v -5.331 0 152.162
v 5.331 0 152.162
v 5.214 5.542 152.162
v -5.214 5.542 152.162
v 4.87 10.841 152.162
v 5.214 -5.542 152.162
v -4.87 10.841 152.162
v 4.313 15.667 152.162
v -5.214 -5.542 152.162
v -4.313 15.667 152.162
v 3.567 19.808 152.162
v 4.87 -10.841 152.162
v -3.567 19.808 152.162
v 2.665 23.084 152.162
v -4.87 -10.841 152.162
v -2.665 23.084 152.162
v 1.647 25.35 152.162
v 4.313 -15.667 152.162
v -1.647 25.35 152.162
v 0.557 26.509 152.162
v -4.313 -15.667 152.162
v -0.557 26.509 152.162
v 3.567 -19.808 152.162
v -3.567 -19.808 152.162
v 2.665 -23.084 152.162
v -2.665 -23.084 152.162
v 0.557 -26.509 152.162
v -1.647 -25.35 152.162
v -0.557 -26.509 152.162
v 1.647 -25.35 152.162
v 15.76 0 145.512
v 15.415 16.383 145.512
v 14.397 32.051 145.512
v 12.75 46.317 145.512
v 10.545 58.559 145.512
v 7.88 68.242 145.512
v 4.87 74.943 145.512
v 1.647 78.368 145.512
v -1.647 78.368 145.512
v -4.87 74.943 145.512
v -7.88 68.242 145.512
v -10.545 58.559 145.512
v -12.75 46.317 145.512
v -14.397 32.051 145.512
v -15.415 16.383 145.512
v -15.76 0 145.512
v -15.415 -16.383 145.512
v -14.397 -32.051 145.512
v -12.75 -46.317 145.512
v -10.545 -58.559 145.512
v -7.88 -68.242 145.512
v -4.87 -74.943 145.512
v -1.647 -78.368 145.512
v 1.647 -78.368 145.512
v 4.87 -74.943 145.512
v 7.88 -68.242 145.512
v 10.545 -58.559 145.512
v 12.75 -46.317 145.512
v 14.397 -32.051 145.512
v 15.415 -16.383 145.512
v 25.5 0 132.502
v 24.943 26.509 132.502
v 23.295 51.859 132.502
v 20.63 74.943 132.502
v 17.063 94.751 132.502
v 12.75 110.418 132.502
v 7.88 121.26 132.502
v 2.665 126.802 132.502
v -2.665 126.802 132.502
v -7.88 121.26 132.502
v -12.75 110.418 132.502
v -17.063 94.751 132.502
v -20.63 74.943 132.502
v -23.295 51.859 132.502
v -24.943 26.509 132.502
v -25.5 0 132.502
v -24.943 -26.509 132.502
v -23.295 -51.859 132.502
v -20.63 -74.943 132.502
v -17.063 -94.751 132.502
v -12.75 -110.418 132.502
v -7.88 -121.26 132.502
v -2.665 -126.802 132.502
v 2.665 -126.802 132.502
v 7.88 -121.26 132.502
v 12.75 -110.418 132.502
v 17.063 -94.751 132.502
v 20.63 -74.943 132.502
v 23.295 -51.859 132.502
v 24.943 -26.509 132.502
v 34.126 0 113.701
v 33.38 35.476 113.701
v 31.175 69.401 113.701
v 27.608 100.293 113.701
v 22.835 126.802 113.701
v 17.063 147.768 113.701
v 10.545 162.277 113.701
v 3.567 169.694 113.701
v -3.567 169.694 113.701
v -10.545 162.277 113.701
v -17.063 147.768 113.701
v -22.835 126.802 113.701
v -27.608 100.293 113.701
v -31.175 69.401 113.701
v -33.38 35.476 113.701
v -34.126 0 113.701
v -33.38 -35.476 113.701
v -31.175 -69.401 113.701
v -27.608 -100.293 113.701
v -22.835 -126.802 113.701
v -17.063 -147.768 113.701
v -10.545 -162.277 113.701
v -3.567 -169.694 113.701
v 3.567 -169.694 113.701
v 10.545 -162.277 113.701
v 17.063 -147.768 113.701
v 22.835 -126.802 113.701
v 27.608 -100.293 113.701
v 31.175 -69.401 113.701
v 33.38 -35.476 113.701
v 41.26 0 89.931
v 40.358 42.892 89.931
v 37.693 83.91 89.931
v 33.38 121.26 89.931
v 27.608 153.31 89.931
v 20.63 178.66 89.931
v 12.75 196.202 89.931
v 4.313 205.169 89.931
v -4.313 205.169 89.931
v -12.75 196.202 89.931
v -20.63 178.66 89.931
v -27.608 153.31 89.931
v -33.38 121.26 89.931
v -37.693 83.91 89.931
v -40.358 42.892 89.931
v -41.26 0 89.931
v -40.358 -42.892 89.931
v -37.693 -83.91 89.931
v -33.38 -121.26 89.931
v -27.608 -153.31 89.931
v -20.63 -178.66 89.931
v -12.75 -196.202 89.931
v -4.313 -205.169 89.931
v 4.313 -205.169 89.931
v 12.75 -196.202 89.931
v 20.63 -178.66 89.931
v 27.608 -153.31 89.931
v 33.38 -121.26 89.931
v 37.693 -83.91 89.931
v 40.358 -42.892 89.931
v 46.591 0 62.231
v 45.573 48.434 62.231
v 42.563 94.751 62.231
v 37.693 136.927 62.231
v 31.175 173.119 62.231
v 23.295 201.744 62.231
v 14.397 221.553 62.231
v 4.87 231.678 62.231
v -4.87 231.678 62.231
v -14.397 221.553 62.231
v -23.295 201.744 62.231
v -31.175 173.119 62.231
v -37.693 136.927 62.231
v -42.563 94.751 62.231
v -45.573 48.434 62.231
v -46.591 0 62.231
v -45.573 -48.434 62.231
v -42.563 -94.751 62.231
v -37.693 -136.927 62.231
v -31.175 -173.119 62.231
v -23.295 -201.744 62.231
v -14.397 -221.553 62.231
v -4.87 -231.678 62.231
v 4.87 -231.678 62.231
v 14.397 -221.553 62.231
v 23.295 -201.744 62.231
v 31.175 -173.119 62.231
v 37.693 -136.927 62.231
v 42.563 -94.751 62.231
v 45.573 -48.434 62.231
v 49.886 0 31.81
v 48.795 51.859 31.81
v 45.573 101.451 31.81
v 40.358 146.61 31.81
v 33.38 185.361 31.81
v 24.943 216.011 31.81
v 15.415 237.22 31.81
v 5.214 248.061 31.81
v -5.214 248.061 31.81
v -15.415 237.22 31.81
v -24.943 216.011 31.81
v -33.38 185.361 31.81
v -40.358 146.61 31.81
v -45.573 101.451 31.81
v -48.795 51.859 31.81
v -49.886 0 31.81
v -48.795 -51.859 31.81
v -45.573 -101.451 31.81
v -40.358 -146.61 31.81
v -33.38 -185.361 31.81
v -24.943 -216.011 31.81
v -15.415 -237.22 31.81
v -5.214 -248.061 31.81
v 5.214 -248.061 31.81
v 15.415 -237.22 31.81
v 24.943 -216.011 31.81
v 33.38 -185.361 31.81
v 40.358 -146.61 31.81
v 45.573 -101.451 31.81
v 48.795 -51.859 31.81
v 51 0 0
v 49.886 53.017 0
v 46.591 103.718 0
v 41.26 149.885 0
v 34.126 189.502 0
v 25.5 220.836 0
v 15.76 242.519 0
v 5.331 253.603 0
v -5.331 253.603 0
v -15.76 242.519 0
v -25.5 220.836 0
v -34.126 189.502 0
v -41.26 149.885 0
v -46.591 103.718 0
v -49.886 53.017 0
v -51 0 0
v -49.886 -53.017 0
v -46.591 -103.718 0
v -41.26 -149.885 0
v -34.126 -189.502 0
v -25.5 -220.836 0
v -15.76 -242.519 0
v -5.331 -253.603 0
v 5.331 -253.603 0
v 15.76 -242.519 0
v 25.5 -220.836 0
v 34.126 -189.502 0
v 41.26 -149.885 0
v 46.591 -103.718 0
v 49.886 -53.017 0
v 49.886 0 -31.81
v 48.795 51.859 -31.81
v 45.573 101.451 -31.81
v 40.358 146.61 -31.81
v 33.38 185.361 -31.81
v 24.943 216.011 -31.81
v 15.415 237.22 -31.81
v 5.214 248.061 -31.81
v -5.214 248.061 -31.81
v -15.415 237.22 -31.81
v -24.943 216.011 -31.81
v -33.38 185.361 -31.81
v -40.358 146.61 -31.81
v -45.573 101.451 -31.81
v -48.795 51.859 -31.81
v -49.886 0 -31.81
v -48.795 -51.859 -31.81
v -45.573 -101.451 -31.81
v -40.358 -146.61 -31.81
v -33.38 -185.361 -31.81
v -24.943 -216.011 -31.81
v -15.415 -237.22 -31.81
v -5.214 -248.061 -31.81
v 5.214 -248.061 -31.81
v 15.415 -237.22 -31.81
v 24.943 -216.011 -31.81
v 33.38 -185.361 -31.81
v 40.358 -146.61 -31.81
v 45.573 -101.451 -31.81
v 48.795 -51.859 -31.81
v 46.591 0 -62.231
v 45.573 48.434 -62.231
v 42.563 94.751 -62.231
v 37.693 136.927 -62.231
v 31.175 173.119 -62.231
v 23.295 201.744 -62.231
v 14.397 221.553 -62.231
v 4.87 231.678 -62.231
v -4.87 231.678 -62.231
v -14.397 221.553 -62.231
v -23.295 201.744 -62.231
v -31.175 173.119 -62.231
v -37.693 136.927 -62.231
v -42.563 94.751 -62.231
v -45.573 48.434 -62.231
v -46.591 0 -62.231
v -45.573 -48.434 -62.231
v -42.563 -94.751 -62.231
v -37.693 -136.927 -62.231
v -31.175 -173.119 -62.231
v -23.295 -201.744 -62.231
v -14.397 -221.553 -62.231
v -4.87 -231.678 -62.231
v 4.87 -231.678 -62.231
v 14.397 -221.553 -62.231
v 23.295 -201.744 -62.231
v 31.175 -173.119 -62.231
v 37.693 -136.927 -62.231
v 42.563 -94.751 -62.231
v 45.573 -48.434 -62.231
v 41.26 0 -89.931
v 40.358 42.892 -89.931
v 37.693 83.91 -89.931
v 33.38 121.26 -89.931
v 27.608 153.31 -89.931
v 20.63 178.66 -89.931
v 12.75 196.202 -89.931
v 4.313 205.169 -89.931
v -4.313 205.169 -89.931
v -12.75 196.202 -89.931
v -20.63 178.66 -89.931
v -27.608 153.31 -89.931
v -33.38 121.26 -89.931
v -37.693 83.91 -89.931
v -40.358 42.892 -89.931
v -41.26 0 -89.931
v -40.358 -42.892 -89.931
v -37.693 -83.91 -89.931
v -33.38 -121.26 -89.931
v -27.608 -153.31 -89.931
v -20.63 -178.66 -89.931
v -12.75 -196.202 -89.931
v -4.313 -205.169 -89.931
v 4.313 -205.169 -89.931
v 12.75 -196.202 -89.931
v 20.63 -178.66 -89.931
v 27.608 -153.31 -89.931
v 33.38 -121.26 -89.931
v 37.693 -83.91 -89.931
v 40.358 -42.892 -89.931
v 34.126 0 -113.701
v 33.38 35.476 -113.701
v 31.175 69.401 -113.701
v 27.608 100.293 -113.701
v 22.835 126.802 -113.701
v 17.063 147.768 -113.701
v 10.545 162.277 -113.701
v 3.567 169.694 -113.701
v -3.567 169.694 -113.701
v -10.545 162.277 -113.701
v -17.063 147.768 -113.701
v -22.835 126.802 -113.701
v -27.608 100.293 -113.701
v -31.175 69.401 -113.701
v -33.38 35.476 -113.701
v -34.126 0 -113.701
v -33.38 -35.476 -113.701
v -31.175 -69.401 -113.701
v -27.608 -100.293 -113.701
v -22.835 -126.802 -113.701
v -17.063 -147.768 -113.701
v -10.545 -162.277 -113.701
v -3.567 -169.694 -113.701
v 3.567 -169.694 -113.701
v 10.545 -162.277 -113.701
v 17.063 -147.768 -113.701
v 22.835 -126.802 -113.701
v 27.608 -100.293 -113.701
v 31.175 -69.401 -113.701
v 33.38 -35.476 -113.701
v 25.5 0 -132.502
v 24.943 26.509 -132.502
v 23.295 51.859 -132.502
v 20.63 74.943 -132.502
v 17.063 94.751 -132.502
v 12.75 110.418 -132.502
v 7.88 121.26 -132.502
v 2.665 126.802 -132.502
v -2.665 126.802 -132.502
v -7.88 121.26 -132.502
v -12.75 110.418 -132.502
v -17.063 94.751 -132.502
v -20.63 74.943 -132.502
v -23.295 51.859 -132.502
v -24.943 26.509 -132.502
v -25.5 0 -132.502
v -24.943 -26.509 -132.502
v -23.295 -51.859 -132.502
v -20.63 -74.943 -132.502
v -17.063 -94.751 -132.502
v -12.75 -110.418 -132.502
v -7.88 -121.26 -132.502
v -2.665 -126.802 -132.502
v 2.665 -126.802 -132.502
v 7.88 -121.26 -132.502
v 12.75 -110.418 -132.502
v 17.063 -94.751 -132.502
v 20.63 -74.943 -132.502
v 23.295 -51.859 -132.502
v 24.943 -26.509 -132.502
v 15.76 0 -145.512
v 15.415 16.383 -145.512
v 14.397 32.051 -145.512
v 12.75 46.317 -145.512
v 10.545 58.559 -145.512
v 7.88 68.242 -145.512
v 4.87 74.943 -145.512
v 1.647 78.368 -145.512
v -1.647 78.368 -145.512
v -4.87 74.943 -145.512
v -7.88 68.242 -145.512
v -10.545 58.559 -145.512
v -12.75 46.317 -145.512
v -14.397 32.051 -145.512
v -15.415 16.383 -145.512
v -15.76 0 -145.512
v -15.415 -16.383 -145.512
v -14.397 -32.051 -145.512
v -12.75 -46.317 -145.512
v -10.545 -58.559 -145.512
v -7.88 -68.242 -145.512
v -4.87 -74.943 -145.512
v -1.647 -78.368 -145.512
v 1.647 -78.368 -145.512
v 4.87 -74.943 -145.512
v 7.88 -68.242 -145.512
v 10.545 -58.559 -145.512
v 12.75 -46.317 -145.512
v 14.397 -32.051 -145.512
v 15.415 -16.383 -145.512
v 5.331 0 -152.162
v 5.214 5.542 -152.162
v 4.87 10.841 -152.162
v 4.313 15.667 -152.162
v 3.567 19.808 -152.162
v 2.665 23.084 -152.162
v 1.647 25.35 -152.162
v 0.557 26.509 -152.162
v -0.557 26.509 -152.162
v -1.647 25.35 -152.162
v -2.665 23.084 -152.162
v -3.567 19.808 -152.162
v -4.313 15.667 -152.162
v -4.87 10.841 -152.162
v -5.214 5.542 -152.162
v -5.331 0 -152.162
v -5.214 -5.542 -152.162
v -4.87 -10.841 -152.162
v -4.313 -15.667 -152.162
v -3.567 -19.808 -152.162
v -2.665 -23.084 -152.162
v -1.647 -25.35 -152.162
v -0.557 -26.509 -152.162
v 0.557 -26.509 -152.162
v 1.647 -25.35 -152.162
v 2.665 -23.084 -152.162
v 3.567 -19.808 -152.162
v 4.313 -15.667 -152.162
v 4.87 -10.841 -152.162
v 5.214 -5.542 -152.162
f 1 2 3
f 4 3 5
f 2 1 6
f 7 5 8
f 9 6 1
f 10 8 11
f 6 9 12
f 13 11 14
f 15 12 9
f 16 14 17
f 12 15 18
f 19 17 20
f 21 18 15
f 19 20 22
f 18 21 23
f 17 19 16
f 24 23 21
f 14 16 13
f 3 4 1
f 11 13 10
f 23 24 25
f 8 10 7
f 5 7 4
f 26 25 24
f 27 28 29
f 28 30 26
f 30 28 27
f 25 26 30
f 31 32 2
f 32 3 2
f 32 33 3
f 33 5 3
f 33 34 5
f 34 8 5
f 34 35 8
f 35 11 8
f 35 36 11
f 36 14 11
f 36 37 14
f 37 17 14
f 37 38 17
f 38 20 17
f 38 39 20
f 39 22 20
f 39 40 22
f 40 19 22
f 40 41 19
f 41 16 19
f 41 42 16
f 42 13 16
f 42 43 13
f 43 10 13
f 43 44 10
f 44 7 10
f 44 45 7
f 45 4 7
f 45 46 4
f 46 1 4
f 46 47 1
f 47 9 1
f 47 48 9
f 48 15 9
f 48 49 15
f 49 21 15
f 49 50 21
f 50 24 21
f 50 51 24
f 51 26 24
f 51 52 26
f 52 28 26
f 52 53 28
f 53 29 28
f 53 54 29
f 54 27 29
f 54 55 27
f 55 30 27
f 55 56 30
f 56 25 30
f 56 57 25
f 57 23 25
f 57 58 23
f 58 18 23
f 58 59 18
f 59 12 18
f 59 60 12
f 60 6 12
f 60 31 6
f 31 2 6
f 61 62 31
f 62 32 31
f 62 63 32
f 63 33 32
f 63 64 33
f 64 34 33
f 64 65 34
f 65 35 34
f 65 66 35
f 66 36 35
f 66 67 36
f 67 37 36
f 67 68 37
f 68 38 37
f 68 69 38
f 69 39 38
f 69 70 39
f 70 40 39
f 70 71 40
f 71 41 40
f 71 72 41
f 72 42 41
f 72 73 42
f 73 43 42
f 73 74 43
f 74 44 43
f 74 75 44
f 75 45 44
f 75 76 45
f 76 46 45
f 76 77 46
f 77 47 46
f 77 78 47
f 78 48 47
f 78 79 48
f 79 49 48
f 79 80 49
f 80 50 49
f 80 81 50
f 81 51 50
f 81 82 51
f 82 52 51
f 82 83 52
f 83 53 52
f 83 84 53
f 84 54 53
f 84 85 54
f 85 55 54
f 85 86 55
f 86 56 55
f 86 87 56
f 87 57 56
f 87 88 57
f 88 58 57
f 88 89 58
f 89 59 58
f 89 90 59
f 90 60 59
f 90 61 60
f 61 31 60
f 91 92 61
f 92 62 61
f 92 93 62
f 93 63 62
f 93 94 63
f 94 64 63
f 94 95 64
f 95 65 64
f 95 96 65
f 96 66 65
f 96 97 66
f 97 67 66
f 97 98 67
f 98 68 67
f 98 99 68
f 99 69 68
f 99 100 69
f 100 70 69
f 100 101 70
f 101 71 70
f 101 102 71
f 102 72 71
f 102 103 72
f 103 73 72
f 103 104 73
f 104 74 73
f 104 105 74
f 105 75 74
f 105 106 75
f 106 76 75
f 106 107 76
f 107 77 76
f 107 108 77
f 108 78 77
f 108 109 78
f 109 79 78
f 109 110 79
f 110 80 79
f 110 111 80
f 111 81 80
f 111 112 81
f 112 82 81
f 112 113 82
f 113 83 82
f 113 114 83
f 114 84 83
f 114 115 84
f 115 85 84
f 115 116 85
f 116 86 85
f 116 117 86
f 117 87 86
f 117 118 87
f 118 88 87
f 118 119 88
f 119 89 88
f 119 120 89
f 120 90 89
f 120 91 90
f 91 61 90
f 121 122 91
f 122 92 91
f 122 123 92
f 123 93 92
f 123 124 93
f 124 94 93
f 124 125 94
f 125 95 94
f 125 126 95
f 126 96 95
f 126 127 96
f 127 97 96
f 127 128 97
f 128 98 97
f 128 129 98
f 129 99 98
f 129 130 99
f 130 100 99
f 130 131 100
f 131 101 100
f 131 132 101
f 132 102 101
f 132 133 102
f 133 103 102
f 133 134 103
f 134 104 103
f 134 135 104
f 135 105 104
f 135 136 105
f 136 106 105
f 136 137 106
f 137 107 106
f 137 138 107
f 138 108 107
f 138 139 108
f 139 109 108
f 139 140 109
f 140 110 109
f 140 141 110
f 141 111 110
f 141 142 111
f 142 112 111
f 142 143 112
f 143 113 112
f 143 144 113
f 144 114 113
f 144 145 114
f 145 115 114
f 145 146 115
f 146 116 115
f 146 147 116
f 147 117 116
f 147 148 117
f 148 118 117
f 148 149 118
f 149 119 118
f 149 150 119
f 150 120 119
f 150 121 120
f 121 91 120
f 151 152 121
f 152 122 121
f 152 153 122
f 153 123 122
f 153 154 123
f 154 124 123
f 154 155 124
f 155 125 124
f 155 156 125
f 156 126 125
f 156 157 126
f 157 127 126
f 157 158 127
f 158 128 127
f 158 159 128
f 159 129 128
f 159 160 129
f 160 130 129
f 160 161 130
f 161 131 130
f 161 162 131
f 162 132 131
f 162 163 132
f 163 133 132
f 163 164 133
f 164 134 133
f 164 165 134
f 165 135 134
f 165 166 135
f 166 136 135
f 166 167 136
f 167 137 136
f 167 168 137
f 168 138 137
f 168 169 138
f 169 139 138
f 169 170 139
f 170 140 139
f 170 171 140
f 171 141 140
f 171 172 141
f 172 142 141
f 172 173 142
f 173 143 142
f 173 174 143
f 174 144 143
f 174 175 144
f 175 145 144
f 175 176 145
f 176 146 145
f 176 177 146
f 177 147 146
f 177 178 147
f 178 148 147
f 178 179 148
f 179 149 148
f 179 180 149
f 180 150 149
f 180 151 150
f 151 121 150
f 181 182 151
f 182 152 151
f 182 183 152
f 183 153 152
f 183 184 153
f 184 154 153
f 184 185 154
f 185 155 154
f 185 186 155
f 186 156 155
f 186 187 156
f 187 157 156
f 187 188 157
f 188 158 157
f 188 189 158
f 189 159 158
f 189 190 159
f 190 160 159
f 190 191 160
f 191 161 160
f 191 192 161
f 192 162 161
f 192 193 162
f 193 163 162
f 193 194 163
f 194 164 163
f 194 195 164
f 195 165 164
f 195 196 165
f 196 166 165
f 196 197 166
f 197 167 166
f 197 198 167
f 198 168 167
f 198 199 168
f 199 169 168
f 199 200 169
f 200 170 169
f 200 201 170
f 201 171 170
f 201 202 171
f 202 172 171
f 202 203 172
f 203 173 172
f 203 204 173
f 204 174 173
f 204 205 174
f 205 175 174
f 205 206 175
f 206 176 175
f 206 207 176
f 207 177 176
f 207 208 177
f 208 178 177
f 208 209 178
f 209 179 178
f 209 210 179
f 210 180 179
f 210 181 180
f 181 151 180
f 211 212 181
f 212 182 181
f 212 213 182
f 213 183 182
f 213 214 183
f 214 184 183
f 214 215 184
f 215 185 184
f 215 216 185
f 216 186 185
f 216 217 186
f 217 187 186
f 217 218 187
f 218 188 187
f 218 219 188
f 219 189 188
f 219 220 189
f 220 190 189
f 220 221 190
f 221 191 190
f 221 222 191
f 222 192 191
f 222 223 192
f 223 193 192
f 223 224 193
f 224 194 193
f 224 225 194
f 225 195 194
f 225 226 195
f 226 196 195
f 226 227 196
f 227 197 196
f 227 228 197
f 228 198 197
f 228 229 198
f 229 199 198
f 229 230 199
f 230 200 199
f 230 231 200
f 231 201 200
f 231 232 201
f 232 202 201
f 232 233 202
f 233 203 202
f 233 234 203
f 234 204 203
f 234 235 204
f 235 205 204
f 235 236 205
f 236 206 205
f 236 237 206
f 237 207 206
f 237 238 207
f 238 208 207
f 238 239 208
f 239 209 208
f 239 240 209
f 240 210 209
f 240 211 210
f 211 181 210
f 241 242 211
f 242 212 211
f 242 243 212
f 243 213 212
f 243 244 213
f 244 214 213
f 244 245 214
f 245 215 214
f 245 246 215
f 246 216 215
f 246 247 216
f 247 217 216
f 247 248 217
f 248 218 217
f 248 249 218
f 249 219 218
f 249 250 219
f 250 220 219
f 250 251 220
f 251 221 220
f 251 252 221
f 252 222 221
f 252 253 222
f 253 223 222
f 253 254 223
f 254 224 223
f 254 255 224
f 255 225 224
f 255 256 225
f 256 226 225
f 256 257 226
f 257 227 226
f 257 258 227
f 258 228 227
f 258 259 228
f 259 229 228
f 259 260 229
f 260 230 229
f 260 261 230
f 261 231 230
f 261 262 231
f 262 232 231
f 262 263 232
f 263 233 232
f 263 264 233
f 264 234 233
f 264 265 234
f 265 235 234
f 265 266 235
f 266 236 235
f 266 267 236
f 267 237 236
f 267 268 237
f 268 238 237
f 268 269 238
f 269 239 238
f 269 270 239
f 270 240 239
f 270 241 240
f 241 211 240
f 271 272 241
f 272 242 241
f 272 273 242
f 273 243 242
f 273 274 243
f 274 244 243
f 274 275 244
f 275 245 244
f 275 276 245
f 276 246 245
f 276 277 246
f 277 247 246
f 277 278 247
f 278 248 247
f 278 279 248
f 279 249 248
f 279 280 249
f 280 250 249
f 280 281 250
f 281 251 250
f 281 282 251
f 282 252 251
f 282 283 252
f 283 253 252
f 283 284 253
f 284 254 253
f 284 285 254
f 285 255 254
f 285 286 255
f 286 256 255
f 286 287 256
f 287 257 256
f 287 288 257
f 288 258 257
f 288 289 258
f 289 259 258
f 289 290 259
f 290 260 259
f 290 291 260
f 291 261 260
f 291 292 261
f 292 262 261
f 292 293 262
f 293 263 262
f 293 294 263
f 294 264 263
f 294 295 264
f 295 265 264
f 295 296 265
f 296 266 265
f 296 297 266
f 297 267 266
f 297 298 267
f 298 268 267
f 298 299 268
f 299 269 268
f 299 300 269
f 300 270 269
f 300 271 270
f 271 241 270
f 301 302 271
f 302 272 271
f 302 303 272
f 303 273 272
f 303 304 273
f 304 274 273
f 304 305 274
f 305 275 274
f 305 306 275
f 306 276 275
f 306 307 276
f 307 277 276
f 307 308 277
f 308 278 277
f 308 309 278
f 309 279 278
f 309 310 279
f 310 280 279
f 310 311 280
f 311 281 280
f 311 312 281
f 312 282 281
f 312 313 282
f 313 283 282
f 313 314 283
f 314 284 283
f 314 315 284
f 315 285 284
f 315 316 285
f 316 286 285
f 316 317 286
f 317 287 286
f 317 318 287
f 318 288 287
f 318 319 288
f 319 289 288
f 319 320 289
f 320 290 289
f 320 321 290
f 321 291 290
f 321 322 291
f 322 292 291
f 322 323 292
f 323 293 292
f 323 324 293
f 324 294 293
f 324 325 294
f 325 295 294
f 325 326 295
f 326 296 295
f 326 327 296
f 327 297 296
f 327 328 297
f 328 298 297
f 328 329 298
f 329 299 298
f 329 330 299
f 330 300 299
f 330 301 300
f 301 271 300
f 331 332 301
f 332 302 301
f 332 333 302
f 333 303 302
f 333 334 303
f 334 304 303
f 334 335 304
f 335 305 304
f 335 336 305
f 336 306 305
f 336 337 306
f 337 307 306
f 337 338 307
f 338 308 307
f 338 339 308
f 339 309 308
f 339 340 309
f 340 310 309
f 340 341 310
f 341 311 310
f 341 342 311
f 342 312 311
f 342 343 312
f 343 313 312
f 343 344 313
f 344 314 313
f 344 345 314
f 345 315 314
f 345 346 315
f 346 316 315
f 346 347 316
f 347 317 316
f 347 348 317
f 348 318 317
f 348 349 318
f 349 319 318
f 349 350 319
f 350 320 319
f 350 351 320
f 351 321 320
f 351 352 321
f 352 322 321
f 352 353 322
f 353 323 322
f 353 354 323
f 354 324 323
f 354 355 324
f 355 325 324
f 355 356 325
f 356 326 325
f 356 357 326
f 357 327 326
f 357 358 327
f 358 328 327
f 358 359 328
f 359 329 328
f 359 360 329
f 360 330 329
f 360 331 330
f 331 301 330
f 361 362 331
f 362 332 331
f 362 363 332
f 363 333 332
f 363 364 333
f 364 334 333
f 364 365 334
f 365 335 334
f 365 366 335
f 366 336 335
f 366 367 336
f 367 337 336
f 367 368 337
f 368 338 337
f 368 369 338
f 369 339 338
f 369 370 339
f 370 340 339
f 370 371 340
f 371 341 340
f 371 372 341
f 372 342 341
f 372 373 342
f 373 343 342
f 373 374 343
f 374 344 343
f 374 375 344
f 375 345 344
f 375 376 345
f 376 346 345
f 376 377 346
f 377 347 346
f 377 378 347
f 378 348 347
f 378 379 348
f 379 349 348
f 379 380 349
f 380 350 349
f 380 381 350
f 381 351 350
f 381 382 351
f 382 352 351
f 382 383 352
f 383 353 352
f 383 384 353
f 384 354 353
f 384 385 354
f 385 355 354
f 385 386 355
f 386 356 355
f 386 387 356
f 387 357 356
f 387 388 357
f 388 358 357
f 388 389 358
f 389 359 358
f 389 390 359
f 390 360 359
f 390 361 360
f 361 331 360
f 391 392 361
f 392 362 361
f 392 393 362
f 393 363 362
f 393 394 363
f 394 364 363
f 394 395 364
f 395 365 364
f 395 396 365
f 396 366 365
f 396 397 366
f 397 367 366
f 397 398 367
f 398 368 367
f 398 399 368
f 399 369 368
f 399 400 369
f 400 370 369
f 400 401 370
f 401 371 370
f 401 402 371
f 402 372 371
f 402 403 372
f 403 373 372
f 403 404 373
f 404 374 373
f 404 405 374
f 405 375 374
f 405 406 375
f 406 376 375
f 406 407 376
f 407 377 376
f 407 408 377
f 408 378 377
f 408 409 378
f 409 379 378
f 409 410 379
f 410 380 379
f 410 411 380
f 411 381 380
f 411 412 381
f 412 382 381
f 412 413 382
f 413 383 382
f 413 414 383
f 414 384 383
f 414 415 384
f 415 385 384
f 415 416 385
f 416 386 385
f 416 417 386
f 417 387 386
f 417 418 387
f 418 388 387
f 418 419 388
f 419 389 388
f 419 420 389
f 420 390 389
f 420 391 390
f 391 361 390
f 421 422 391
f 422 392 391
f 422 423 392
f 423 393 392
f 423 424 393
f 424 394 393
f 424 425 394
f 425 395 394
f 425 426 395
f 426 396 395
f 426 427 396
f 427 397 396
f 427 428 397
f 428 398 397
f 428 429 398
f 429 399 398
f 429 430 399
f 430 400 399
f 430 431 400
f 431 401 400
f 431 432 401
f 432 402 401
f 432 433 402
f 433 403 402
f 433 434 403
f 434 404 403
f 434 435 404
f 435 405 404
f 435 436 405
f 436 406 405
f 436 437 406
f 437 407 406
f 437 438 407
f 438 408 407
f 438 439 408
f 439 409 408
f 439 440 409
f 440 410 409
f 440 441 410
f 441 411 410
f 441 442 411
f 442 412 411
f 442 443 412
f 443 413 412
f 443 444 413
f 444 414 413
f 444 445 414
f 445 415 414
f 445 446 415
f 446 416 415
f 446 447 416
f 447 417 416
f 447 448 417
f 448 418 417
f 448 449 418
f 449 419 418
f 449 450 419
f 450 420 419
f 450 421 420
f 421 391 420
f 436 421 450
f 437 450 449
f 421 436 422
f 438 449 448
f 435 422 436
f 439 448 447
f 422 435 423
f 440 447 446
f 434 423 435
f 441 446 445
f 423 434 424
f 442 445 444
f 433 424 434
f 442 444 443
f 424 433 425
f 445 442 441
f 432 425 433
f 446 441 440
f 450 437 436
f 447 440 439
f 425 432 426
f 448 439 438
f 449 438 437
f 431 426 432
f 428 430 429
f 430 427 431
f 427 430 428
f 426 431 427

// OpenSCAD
// Generated by SolidPython 1.0.1 on 2020-07-29 00:46:45


scale(v = [3, 15, 9]) {
	sphere(r = 17);
}
/***********************************************
*********      SolidPython code:      **********
************************************************
 
# import packages: SolidPython
from solid import *
from solid.utils import *
from itertools import chain, combinations, permutations


class Resize:

    def __init__(self, scad_file):
        self.scad_file = scad_file
        #self.scad_file = import_scad(scad_file)
        # cone/cylinder param:
        self.r1 = 0
        self.r2 = 0
        self.h = 0
        # rectangular prism param:
        self.w = 0
        self.l = 0
        # ellipse param:
        self.r = 0

    # import OpenScad code (file name corresponds to shape)


    # classify shape + parameters
    def assign(self, param1, param2, param3):
        if self.scad_file == 'cone.scad':
            self.r1 = param1
            self.r2 = param2
            self.h = param3
        elif self.scad_file == 'cylinder.scad':
            self.r1 = param1
            self.r2 = param2
            self.h = param3
        elif self.scad_file == 'rectangularPrism.scad':
            self.h = param1
            self.l = param2
            self.w = param3
        else:
            self.r = param1
            self.h = param2

    # resize parameters
    def iterate(self):
        x = range(3, 20, 2)
        i = 1
        if self.scad_file == 'cone.scad':
            tempList = list(permutations(x, 2))
            for temp in tempList:
                param1 = temp[0]
                param2 = temp[1]
                filepath = 'produced_scad_files/' + 'cone' + str(param1) + '_' + str(param2) + '_' + '.scad'
                scad_render_to_file(cylinder(h=param1, r1=param2, r2=0), filepath)

        elif self.scad_file == 'cylinder.scad':
            tempList = list(permutations(x, 3))
            for temp in tempList:
                param1 = temp[0]
                param2 = temp[1]
                filepath = 'produced_scad_files/' + 'cylinder' + str(param1) + '_' + str(param2) + '_' + '.scad'
                scad_render_to_file(cylinder(h=param1, r1=param2, r2=param2), filepath)

        elif self.scad_file == 'rectangularPrism.scad':
            tempList = list(permutations(x, 3))
            for temp in tempList:
                param1 = temp[0]
                param2 = temp[1]
                param3 = temp[2]
                filepath = 'produced_scad_files/' + 'rectangularPrism' + str(param1) + '_' + str(param2) + '_' + str(
                    param3) + '.scad'
                scad_render_to_file(cube(size=(param1, param2, param3)), filepath)

        elif self.scad_file == 'ellipse.scad':
            tempList = list(permutations(x, 4))
            for temp in tempList:
                param1 = temp[0]
                param2 = temp[1]
                param3 = temp[2]
                param4 = temp[3]
                filepath = 'produced_scad_files/' + 'ellipse' + str(param1) + '_' + str(param2) + '_' + str(param3) + '_' + str(param4) + '.scad'
                scad_render_to_file(scale([param1, param2, param3])(sphere(r=param4)), filepath)

    def render_to_scadfile(self):
        scad_render_to_file(scad, 'example.scad') 
 
************************************************/
